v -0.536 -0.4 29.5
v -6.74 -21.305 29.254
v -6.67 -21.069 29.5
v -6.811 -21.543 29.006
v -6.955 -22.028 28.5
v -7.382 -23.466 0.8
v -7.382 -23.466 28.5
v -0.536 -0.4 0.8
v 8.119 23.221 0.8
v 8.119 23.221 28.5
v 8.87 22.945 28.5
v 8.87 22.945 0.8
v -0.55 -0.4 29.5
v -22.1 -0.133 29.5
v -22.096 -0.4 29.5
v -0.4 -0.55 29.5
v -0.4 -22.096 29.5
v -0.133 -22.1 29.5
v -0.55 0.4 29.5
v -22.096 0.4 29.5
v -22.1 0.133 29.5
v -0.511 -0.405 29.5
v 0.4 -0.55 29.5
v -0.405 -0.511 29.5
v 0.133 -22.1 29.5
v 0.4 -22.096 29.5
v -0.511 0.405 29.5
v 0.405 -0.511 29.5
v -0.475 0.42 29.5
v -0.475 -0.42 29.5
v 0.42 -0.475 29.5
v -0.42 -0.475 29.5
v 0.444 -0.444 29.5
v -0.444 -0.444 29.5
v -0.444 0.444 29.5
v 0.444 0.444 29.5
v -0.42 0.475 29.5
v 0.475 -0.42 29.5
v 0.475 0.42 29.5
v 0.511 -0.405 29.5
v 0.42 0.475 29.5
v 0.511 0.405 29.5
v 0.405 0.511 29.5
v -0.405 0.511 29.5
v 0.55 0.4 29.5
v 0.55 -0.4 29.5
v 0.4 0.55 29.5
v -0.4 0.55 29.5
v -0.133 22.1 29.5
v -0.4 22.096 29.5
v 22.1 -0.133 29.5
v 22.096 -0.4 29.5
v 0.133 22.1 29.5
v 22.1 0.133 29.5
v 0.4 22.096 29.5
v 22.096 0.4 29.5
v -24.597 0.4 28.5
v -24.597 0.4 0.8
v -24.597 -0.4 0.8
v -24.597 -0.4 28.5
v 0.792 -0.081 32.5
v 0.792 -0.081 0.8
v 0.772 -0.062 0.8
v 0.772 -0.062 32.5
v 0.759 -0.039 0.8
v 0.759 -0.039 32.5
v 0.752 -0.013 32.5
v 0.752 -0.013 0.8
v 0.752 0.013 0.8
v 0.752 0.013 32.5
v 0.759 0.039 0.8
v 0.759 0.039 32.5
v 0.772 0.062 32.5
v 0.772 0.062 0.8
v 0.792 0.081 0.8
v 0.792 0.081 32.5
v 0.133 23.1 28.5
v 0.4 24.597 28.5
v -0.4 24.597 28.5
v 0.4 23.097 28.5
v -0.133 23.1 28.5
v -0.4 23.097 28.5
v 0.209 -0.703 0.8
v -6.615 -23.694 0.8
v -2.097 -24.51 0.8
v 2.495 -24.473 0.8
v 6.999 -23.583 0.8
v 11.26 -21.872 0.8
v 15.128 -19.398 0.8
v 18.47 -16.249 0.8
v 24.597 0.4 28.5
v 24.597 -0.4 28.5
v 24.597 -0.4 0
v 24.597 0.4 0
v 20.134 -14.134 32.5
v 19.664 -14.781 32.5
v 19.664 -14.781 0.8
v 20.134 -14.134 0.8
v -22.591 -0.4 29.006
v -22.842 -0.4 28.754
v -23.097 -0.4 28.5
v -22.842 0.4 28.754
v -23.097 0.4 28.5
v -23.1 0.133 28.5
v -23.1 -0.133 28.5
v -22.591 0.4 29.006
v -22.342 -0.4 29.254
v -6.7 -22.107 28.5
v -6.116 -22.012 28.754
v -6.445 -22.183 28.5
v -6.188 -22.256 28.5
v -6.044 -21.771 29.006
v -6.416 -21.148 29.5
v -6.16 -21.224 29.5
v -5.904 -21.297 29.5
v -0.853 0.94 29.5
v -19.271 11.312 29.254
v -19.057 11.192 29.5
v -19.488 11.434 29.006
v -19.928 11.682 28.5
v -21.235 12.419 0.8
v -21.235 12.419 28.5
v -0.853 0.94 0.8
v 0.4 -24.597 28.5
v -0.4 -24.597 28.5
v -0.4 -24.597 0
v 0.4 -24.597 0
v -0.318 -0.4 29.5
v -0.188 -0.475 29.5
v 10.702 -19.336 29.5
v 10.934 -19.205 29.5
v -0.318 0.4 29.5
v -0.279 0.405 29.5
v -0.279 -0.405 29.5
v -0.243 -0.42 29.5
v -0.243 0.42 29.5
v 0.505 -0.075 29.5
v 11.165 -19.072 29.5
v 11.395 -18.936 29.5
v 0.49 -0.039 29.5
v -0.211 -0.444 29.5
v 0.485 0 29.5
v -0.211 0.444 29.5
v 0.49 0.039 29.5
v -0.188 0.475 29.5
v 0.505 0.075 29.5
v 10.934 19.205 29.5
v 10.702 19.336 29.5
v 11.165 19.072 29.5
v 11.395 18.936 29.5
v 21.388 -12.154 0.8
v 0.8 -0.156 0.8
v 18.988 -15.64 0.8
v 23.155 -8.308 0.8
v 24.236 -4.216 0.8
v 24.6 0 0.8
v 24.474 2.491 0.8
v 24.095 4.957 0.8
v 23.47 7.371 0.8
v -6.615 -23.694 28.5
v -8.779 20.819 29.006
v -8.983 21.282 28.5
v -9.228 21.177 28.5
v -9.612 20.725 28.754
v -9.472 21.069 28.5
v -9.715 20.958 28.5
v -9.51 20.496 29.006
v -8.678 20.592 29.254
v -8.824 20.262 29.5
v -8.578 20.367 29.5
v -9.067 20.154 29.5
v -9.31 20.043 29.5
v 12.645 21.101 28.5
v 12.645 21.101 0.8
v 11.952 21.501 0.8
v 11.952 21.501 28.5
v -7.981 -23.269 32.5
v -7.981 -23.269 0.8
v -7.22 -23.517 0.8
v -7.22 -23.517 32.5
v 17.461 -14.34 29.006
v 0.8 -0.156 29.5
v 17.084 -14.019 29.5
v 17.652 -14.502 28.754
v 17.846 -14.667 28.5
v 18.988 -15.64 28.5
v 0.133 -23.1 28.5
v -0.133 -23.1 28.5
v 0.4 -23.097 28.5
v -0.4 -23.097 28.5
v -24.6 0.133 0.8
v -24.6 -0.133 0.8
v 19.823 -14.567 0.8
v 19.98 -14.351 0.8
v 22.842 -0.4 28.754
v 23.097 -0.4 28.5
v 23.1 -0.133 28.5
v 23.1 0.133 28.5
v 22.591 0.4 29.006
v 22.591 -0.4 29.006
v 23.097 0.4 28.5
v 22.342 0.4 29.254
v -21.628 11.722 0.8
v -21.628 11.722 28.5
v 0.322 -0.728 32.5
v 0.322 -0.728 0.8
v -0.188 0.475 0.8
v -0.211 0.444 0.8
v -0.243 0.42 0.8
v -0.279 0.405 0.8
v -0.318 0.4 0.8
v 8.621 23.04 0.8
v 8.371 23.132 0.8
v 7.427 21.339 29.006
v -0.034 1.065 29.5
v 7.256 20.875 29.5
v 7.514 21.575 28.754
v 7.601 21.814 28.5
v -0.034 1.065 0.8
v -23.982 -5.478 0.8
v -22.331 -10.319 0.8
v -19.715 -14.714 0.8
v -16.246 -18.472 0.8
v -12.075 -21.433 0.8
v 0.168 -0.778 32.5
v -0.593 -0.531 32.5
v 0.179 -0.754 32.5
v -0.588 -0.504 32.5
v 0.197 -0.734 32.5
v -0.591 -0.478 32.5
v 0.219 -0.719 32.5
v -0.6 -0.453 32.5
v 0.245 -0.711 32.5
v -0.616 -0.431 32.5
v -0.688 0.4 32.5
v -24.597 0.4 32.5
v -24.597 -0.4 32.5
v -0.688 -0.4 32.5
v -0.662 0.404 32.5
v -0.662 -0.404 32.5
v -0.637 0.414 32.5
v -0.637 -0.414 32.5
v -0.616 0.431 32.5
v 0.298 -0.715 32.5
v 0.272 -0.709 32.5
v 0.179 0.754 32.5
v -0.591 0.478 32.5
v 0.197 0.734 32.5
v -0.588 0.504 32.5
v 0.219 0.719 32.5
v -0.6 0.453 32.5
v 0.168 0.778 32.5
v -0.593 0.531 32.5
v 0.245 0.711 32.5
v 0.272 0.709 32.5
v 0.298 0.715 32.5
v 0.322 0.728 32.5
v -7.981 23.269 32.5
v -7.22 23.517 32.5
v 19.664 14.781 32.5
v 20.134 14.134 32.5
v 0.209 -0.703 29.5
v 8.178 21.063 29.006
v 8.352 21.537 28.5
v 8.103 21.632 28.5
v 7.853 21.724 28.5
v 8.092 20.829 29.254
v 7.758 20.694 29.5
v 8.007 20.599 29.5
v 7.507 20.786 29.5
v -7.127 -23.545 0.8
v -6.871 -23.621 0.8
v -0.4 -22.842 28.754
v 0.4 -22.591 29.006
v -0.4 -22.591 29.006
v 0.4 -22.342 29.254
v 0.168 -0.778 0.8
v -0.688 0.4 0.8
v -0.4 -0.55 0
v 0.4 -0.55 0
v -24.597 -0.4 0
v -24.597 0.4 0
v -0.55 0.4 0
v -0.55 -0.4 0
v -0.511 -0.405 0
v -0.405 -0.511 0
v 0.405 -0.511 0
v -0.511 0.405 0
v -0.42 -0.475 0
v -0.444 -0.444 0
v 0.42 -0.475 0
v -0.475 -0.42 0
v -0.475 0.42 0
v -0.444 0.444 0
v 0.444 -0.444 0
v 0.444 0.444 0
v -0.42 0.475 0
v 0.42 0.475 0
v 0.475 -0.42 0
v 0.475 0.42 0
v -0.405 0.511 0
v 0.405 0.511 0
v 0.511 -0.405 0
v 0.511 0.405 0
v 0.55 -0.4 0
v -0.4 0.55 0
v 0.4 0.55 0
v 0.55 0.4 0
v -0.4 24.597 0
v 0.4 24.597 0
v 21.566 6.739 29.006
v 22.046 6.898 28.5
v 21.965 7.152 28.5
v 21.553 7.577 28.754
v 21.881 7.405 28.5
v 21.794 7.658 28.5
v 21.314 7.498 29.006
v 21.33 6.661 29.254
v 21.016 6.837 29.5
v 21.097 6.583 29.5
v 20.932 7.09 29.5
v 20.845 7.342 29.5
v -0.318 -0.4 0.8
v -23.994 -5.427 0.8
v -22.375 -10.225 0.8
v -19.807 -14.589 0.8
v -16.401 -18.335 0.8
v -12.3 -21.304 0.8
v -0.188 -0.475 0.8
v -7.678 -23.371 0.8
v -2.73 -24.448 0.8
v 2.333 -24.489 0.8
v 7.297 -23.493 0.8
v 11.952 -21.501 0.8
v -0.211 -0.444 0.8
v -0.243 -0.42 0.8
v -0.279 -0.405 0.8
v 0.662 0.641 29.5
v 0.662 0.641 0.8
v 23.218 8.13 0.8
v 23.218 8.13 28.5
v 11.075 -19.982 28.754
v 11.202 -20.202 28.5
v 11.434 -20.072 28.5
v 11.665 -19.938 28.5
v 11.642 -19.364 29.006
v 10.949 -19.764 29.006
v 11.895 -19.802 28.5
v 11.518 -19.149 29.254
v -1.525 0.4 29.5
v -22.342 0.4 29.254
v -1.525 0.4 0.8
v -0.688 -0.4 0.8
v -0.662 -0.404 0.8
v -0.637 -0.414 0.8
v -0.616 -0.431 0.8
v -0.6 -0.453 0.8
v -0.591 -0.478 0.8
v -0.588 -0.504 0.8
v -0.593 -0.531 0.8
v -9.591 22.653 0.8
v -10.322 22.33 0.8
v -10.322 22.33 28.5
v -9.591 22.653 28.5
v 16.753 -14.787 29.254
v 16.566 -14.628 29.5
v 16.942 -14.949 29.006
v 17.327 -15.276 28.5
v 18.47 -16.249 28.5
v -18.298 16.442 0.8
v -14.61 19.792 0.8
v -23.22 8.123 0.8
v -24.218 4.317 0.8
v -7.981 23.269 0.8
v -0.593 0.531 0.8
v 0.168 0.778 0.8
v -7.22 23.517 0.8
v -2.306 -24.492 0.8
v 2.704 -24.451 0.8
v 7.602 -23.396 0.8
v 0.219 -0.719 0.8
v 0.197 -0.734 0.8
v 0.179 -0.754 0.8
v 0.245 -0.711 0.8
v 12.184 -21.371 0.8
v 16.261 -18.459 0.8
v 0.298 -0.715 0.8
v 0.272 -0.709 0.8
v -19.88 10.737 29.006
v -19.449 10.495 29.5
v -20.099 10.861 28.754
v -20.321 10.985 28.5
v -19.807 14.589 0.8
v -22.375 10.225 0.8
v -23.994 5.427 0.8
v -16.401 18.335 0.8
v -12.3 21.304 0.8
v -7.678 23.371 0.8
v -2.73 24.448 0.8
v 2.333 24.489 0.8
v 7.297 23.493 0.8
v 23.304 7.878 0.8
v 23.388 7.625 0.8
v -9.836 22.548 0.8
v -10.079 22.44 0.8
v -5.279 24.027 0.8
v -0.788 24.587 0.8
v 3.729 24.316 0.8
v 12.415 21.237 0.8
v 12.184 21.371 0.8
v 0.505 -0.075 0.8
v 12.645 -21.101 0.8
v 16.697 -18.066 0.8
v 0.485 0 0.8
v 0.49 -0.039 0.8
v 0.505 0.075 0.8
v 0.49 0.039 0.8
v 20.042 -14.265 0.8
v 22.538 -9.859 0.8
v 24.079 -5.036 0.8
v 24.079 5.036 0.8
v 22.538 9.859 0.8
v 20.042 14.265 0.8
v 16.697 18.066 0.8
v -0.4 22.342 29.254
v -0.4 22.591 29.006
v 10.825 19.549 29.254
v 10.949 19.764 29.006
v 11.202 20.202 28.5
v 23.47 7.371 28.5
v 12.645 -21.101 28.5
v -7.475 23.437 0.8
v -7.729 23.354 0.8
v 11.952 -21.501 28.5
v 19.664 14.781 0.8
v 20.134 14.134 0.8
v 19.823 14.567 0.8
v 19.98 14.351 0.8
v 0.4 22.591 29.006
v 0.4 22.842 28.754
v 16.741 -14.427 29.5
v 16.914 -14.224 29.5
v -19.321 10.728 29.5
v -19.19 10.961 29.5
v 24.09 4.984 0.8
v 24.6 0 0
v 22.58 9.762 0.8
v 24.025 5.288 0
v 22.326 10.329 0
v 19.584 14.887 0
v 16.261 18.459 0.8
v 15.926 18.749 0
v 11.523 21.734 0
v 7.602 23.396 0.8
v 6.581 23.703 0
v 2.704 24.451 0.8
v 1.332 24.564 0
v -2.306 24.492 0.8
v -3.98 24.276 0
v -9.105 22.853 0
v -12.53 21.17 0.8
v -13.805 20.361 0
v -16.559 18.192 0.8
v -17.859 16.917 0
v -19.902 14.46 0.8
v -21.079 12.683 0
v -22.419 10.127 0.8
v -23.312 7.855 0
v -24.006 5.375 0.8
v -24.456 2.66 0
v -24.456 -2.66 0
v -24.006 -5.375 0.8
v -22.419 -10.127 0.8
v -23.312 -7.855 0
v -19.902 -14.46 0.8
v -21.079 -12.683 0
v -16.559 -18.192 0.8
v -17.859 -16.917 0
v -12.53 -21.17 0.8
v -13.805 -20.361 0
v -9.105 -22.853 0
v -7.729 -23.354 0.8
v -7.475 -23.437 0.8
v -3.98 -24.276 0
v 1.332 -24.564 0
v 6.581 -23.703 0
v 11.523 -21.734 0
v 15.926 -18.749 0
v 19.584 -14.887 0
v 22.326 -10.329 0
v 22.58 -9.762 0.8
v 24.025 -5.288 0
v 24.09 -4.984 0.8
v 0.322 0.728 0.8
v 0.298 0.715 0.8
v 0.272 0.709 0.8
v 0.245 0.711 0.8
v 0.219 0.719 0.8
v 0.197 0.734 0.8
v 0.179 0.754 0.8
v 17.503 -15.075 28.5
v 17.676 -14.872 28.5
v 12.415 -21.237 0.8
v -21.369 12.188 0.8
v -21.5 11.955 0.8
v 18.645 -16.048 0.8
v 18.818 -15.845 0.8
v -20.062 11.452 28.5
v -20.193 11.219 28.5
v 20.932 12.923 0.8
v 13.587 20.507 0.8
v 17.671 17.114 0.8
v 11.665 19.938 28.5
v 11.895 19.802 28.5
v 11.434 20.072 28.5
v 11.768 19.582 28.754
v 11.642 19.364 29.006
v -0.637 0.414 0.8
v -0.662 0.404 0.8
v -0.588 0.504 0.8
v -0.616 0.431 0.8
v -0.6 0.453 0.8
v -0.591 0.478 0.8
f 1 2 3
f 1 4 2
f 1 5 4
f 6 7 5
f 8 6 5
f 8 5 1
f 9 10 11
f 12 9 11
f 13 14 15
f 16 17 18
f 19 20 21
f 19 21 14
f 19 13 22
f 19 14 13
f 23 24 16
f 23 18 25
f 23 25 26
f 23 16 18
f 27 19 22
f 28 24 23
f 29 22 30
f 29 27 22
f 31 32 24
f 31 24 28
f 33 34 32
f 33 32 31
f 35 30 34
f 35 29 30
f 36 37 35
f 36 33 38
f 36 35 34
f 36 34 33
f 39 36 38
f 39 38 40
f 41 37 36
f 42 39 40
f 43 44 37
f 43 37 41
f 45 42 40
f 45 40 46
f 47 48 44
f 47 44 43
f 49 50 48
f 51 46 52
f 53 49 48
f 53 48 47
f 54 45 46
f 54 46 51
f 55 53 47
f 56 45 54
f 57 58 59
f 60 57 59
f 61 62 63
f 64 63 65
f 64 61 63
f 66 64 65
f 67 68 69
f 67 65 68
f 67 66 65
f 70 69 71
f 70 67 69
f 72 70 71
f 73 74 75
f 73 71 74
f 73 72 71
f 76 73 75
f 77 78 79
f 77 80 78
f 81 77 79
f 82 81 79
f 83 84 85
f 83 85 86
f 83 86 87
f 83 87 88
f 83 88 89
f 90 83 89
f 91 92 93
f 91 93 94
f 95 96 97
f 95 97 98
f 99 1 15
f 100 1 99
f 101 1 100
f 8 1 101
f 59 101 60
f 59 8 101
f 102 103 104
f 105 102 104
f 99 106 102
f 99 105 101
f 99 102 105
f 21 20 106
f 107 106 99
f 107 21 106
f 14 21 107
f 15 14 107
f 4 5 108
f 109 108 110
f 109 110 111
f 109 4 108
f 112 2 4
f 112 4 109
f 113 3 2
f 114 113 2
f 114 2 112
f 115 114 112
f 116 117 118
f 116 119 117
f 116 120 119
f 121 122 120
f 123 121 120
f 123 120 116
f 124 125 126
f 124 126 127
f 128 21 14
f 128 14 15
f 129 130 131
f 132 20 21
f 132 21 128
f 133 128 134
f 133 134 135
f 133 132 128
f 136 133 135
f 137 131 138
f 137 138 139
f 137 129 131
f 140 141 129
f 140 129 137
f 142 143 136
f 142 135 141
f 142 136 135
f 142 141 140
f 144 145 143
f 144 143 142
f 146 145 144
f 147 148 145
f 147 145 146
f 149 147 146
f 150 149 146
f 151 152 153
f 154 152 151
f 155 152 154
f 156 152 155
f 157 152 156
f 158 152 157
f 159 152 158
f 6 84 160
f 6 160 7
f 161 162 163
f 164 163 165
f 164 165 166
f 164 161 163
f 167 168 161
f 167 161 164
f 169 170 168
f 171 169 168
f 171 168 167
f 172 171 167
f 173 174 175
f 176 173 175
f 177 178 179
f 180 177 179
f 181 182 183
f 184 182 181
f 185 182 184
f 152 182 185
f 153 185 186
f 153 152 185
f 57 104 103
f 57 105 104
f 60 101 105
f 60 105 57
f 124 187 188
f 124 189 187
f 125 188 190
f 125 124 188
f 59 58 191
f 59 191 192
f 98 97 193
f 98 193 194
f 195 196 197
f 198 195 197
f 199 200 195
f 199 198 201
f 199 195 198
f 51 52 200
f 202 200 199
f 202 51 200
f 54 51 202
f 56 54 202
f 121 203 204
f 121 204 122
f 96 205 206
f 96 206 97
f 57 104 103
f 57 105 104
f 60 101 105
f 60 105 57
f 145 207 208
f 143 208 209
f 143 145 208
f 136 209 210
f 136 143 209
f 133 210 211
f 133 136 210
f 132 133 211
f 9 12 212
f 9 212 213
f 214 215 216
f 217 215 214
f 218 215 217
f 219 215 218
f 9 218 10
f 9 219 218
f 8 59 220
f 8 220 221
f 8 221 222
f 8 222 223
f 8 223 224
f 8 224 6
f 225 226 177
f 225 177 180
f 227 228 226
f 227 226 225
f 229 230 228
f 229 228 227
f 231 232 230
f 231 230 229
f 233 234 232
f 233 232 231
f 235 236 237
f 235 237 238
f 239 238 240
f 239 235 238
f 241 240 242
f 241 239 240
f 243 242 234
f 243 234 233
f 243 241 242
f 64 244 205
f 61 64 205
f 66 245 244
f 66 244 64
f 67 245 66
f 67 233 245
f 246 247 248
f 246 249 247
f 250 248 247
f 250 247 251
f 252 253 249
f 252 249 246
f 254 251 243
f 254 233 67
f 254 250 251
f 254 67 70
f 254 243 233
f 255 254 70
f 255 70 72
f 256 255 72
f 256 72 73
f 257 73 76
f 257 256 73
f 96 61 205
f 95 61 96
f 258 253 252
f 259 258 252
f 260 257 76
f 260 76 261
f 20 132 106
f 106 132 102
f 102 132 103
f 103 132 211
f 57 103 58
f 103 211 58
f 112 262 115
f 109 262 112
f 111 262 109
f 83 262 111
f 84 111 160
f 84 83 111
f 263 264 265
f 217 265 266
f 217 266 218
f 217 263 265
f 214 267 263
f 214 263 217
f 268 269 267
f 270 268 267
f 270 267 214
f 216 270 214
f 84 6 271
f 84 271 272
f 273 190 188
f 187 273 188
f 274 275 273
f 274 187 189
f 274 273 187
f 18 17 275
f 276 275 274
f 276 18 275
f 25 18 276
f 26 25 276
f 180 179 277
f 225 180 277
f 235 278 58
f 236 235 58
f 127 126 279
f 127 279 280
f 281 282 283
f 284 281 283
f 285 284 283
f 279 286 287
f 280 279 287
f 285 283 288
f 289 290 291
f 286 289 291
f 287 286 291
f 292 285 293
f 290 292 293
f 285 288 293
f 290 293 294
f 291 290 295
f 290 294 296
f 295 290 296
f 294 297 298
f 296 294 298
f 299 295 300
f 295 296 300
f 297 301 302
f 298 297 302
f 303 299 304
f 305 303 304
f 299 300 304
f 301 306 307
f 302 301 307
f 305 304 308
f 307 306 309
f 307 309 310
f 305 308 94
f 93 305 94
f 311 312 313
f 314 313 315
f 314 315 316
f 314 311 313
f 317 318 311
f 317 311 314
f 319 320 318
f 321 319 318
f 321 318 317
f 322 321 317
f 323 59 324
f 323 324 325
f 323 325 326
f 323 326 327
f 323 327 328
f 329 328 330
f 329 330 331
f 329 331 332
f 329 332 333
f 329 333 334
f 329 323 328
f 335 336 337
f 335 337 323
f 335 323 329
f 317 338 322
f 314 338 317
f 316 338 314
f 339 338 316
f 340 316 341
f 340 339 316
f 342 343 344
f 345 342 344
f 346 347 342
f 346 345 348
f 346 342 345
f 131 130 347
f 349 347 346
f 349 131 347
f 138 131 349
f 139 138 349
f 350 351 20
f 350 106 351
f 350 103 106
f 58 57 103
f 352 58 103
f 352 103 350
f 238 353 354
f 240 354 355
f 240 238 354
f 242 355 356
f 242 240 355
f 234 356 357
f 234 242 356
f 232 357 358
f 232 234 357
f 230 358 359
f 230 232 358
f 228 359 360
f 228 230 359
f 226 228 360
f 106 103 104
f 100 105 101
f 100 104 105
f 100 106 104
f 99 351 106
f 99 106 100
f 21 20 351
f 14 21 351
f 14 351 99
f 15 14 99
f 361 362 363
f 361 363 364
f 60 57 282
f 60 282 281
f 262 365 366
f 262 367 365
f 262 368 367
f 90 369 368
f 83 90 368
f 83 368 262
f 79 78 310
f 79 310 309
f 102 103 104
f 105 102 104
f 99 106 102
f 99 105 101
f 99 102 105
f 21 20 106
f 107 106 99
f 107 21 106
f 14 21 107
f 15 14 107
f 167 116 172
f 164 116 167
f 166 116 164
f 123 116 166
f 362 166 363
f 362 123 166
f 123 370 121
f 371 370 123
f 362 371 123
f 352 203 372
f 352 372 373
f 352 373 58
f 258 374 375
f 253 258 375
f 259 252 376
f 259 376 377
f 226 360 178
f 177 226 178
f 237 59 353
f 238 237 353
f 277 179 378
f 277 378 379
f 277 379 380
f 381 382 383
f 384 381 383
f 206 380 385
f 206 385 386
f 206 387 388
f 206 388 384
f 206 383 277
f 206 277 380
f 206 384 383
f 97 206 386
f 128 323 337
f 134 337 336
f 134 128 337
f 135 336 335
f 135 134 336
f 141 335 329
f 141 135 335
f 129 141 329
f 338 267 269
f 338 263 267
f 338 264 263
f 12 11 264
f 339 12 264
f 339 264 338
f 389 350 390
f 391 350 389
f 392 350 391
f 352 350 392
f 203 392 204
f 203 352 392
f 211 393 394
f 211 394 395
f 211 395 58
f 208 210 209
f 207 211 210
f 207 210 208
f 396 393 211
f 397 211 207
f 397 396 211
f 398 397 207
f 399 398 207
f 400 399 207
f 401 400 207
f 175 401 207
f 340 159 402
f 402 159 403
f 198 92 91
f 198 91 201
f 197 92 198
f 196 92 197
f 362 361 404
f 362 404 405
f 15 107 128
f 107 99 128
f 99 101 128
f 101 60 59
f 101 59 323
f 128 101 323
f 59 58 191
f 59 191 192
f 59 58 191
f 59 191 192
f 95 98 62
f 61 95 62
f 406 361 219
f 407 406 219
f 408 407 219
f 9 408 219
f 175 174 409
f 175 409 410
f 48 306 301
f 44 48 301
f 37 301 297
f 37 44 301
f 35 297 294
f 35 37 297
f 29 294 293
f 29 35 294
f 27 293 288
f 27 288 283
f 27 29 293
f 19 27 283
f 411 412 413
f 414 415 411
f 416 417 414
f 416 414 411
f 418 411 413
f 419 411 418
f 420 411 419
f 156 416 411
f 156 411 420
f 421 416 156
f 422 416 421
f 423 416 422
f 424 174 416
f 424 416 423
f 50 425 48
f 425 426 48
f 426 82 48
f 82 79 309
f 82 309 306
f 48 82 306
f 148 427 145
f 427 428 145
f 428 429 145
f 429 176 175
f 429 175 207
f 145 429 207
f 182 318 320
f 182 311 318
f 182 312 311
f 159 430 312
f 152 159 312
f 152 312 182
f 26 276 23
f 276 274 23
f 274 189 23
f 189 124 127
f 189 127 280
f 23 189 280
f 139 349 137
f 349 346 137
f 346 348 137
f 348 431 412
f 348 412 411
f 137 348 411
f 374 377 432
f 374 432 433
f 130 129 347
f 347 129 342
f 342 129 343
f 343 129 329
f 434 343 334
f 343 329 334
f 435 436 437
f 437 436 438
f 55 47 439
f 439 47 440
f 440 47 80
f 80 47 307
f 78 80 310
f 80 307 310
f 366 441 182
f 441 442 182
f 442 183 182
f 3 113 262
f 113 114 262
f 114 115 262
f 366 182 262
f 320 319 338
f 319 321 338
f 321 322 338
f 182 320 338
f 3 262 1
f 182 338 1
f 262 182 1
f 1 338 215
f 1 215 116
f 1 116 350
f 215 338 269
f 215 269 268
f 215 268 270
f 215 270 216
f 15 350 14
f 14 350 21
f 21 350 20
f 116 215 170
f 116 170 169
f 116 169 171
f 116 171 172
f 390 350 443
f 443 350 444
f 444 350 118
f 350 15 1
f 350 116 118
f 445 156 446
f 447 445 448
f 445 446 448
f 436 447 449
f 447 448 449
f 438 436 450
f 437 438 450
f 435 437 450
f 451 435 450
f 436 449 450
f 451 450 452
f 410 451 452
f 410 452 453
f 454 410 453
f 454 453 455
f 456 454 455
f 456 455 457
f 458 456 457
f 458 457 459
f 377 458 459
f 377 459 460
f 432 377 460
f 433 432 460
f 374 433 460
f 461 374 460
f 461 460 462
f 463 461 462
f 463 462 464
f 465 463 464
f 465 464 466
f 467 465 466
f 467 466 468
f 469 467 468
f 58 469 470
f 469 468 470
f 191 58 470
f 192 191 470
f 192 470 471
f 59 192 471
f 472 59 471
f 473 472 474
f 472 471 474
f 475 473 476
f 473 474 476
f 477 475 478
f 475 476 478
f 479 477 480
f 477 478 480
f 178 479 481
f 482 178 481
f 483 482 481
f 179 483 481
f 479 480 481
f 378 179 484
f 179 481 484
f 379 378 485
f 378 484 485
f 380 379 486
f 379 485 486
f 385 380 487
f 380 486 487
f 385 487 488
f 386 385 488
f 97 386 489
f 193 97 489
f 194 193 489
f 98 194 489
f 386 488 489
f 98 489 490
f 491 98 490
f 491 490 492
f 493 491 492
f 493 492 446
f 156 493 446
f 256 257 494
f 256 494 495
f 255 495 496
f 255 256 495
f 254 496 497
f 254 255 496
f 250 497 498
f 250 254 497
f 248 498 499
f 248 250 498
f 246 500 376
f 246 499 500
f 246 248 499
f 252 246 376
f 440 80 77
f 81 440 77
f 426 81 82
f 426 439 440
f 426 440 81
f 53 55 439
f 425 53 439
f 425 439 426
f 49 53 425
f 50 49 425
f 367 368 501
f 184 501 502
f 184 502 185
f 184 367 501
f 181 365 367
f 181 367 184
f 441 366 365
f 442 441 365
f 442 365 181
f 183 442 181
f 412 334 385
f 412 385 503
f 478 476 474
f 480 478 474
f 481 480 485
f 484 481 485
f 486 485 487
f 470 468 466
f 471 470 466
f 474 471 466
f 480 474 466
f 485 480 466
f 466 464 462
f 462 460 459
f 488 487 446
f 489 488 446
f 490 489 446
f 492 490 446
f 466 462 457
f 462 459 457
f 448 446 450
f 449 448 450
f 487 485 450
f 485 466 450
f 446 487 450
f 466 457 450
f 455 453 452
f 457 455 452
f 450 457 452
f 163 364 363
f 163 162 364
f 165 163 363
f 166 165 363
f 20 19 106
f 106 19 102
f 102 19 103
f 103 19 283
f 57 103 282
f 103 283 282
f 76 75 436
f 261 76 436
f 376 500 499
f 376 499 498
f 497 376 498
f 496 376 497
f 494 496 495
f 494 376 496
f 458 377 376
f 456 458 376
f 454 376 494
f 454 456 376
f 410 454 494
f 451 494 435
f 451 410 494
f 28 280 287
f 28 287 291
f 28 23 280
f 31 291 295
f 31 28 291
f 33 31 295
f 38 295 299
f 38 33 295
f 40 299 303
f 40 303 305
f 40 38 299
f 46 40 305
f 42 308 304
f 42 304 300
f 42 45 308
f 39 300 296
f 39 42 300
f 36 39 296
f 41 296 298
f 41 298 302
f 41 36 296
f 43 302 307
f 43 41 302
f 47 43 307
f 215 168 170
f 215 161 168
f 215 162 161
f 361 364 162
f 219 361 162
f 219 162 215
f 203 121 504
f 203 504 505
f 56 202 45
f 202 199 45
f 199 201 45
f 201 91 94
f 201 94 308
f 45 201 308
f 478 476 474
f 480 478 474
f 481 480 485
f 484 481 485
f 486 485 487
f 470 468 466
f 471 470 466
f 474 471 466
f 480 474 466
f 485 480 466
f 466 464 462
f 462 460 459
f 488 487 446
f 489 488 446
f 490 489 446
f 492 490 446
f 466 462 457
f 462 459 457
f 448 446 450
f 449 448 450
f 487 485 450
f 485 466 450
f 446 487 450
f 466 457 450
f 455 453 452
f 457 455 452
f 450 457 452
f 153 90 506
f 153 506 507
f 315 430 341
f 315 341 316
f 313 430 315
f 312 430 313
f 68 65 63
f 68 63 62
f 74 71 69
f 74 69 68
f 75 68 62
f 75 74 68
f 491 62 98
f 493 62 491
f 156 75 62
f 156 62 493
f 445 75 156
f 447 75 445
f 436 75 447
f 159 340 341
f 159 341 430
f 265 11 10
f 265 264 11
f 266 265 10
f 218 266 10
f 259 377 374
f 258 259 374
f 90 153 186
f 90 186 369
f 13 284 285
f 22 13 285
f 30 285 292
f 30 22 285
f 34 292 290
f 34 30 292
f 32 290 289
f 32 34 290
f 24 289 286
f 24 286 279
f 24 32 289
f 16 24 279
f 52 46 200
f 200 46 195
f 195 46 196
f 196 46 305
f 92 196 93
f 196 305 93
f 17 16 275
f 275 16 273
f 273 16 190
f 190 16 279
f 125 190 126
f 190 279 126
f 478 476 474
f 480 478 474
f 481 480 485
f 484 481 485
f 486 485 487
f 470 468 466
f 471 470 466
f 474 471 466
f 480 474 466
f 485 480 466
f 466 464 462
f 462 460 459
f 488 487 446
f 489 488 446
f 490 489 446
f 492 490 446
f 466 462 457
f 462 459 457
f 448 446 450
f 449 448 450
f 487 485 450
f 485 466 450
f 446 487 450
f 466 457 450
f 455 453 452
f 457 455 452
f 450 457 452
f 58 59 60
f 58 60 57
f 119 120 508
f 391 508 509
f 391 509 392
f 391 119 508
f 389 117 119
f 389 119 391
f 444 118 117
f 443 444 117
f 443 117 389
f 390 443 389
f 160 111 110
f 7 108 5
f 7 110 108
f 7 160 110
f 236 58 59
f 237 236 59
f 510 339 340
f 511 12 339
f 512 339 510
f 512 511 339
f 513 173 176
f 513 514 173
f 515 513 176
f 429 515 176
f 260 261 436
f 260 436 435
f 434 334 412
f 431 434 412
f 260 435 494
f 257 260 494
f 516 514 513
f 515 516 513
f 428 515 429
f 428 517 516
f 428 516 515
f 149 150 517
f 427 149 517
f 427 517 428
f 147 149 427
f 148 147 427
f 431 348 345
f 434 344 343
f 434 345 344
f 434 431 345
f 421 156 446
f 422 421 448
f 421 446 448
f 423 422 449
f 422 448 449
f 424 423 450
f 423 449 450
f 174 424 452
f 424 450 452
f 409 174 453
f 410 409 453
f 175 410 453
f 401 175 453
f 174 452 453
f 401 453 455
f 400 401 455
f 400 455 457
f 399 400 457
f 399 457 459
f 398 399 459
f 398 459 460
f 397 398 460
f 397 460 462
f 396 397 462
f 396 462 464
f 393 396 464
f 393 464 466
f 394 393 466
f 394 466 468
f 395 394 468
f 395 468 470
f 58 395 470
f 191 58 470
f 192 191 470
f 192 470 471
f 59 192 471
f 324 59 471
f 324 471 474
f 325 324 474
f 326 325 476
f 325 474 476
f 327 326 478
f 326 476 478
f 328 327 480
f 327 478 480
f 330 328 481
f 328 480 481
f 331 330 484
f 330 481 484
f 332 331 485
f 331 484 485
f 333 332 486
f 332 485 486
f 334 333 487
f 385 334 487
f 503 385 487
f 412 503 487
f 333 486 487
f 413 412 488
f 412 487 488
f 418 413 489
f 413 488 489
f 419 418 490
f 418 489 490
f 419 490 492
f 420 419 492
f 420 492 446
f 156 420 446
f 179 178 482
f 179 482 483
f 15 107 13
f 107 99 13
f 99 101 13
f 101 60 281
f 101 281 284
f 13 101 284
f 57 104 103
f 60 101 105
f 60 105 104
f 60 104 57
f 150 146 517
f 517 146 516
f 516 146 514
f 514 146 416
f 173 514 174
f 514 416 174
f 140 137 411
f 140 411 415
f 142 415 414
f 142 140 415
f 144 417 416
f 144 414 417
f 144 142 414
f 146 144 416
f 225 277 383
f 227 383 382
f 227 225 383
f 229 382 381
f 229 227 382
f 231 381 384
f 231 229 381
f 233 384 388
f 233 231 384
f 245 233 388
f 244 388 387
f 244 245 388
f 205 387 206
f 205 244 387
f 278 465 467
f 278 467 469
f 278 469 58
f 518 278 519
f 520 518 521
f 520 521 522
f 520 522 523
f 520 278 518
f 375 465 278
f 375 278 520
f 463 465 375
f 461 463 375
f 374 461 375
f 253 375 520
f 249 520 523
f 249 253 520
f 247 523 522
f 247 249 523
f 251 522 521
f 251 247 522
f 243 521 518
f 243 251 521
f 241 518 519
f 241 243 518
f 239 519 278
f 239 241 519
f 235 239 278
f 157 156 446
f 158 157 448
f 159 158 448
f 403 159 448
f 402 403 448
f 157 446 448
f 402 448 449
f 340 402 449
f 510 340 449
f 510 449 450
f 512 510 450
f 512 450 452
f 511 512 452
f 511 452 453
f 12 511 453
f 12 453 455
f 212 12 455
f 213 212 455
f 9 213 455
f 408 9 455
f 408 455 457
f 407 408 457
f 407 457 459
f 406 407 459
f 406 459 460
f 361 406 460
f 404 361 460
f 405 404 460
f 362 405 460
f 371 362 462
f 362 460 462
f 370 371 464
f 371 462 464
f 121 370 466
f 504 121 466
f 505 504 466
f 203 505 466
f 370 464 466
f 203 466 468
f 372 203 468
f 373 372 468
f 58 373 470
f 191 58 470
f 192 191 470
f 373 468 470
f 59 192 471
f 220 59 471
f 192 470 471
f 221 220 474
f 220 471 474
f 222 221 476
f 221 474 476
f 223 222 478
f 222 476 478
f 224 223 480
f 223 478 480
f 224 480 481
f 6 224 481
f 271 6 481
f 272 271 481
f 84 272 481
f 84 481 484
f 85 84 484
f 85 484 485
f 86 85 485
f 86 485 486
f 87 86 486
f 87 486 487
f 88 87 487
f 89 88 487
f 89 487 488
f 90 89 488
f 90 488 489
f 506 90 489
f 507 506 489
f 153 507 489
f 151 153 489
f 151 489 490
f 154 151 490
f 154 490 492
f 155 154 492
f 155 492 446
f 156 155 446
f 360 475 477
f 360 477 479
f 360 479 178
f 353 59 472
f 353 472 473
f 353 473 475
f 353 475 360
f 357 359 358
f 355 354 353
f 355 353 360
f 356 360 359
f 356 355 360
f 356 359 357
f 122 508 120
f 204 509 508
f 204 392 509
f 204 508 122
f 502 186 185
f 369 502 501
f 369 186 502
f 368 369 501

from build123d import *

# Parameters (mm, degrees)
PAD_DEPTH    = 32.5
FILLET_R     = 0.1
SKETCH006_R  = 24.6
PAD002_DEPTH = 0.8
PAD001_DEPTH = 29.5
FILLET001_R  = 0.15
PAD004_DEPTH = 29.5
SKETCH011_R  = 24.6
PAD005_DEPTH = 0.8
PAD006_DEPTH = 29.5
FILLET002_R  = 0.15
SKETCH014_R  = 24.6
PAD007_DEPTH = 0.8


with BuildPart() as body:
    # Sketch004 → Pad (new body)
    with BuildSketch(Plane.XY):
        Polygon((-7.9812356684, 23.2692904319), (-0.5505527682, 0.4), (-24.5967477525, 0.4), (-24.5967477525, -0.4), (-0.5505527682, -0.4), (-7.9812356684, -23.2692904319), (-7.2203904554, -23.5165040274), (0.2102924448, -0.6472135955), (19.6640728372, -14.781212381), (20.134301039, -14.1339987855), (0.6805206467, 0), (20.134301039, 14.1339987855), (19.6640728372, 14.781212381), (0.2102924448, 0.6472135955), (-7.2203904554, 23.5165040274), align=None)
    extrude(amount=PAD_DEPTH)

    # Fillet
    fillet_edges = [body.edges().sort_by_distance(p)[0] for p in [
        (0.210292, 0.647214, 16.25),
        (-0.550553, 0.4, 16.25),
        (-0.550553, -0.4, 16.25),
        (0.210292, -0.647214, 16.25),
        (0.680521, 0, 16.25),
    ]]
    fillet(fillet_edges, radius=FILLET_R)

    # Sketch006 → Pad002 (join)
    with BuildSketch(Plane.XY):
        Circle(SKETCH006_R)
    extrude(amount=PAD002_DEPTH)


with BuildPart() as body001:
    # Sketch001 → Pad001 (new body)
    with BuildSketch(Plane.XY):
        Polygon((-0.4, 24.5967477525), (-0.4, 0.4), (-24.5967477525, 0.4), (-24.5967477525, -0.4), (-0.4, -0.4), (-0.4, -24.5967477525), (0.4, -24.5967477525), (0.4, -0.4), (24.5967477525, -0.4), (24.5967477525, 0.4), (0.4, 0.4), (0.4, 24.5967477525), align=None)
    extrude(amount=PAD001_DEPTH)

    # Fillet001
    fillet001_edges = [body001.edges().sort_by_distance(p)[0] for p in [
        (0.4, 0.4, 14.75),
        (-0.4, 0.4, 14.75),
        (-0.4, -0.4, 14.75),
        (0.4, -0.4, 14.75),
    ]]
    fillet(fillet001_edges, radius=FILLET001_R)

    # Sketch007 → Groove001 (revolve, cut)
    with BuildSketch(Plane.XZ):
        Polygon((-24.6, 28.5), (-23.1, 28.5), (-22.1, 29.5), (-24.6, 29.5), align=None)
    revolve(axis=Axis((0, 0, 0), (0, 0, 1)), mode=Mode.SUBTRACT)


with BuildPart() as growing:
    # Sketch009 → Pad004 (new body)
    with BuildSketch(Plane.XY):
        Polygon((-24.5967477525, -0.4), (-24.5967477525, 0.4), (-1.5253733611, 0.4), (-21.6278933982, 11.7215283627), (-21.2353193566, 12.418583326), (-0.8534222236, 0.9397127142), (-10.3221188344, 22.3296632928), (-9.590588736, 22.6534899673), (-0.0341640242, 1.0653600804), (8.1194697573, 23.2214170726), (8.8702444949, 22.9451250291), (0.6622505389, 0.6413538816), (23.2176415251, 8.1302596523), (23.4697280995, 7.3710150547), (0.8001011197, -0.1558196791), (18.9883855233, -15.639731942), (18.469802807, -16.2488887087), (0.2086228294, -0.7029195389), (-6.6149861358, -23.6939223942), (-7.3819204182, -23.4663003249), (-0.5359635593, -0.4), align=None)
    extrude(amount=PAD004_DEPTH)

    # Sketch010 → Groove002 (revolve, cut)
    with BuildSketch(Plane.XZ):
        Polygon((-24.6, 28.5), (-23.1, 28.5), (-22.1, 29.5), (-24.6, 29.5), align=None)
    revolve(axis=Axis((0, 0, 0), (0, 0, 1)), mode=Mode.SUBTRACT)

    # Sketch011 → Pad005 (join)
    with BuildSketch(Plane.XY):
        Circle(SKETCH011_R)
    extrude(amount=PAD005_DEPTH)


with BuildPart() as body004:
    # Sketch012 → Pad006 (new body)
    with BuildSketch(Plane.XY):
        Polygon((11.9519637147, 21.5014084041), (-0.2309401077, 0.4), (-24.5967477525, 0.4), (-24.5967477525, -0.4), (-0.2309401077, -0.4), (11.9519637147, -21.5014084041), (12.6447840378, -21.1014084041), (0.4618802154, 0), (12.6447840378, 21.1014084041), align=None)
    extrude(amount=PAD006_DEPTH)

    # Fillet002
    fillet002_edges = [body004.edges().sort_by_distance(p)[0] for p in [
        (-0.23094, 0.4, 14.75),
        (-0.23094, -0.4, 14.75),
        (0.46188, 0, 14.75),
    ]]
    fillet(fillet002_edges, radius=FILLET002_R)

    # Sketch013 → Groove003 (revolve, cut)
    with BuildSketch(Plane.XZ):
        Polygon((-24.6, 28.5), (-23.1, 28.5), (-22.1, 29.5), (-24.6, 29.5), align=None)
    revolve(axis=Axis((0, 0, 0), (0, 0, 1)), mode=Mode.SUBTRACT)

    # Sketch014 → Pad007 (join)
    with BuildSketch(Plane.XY):
        Circle(SKETCH014_R)
    extrude(amount=PAD007_DEPTH)


solid = Compound([body.part, body001.part, growing.part, body004.part])
